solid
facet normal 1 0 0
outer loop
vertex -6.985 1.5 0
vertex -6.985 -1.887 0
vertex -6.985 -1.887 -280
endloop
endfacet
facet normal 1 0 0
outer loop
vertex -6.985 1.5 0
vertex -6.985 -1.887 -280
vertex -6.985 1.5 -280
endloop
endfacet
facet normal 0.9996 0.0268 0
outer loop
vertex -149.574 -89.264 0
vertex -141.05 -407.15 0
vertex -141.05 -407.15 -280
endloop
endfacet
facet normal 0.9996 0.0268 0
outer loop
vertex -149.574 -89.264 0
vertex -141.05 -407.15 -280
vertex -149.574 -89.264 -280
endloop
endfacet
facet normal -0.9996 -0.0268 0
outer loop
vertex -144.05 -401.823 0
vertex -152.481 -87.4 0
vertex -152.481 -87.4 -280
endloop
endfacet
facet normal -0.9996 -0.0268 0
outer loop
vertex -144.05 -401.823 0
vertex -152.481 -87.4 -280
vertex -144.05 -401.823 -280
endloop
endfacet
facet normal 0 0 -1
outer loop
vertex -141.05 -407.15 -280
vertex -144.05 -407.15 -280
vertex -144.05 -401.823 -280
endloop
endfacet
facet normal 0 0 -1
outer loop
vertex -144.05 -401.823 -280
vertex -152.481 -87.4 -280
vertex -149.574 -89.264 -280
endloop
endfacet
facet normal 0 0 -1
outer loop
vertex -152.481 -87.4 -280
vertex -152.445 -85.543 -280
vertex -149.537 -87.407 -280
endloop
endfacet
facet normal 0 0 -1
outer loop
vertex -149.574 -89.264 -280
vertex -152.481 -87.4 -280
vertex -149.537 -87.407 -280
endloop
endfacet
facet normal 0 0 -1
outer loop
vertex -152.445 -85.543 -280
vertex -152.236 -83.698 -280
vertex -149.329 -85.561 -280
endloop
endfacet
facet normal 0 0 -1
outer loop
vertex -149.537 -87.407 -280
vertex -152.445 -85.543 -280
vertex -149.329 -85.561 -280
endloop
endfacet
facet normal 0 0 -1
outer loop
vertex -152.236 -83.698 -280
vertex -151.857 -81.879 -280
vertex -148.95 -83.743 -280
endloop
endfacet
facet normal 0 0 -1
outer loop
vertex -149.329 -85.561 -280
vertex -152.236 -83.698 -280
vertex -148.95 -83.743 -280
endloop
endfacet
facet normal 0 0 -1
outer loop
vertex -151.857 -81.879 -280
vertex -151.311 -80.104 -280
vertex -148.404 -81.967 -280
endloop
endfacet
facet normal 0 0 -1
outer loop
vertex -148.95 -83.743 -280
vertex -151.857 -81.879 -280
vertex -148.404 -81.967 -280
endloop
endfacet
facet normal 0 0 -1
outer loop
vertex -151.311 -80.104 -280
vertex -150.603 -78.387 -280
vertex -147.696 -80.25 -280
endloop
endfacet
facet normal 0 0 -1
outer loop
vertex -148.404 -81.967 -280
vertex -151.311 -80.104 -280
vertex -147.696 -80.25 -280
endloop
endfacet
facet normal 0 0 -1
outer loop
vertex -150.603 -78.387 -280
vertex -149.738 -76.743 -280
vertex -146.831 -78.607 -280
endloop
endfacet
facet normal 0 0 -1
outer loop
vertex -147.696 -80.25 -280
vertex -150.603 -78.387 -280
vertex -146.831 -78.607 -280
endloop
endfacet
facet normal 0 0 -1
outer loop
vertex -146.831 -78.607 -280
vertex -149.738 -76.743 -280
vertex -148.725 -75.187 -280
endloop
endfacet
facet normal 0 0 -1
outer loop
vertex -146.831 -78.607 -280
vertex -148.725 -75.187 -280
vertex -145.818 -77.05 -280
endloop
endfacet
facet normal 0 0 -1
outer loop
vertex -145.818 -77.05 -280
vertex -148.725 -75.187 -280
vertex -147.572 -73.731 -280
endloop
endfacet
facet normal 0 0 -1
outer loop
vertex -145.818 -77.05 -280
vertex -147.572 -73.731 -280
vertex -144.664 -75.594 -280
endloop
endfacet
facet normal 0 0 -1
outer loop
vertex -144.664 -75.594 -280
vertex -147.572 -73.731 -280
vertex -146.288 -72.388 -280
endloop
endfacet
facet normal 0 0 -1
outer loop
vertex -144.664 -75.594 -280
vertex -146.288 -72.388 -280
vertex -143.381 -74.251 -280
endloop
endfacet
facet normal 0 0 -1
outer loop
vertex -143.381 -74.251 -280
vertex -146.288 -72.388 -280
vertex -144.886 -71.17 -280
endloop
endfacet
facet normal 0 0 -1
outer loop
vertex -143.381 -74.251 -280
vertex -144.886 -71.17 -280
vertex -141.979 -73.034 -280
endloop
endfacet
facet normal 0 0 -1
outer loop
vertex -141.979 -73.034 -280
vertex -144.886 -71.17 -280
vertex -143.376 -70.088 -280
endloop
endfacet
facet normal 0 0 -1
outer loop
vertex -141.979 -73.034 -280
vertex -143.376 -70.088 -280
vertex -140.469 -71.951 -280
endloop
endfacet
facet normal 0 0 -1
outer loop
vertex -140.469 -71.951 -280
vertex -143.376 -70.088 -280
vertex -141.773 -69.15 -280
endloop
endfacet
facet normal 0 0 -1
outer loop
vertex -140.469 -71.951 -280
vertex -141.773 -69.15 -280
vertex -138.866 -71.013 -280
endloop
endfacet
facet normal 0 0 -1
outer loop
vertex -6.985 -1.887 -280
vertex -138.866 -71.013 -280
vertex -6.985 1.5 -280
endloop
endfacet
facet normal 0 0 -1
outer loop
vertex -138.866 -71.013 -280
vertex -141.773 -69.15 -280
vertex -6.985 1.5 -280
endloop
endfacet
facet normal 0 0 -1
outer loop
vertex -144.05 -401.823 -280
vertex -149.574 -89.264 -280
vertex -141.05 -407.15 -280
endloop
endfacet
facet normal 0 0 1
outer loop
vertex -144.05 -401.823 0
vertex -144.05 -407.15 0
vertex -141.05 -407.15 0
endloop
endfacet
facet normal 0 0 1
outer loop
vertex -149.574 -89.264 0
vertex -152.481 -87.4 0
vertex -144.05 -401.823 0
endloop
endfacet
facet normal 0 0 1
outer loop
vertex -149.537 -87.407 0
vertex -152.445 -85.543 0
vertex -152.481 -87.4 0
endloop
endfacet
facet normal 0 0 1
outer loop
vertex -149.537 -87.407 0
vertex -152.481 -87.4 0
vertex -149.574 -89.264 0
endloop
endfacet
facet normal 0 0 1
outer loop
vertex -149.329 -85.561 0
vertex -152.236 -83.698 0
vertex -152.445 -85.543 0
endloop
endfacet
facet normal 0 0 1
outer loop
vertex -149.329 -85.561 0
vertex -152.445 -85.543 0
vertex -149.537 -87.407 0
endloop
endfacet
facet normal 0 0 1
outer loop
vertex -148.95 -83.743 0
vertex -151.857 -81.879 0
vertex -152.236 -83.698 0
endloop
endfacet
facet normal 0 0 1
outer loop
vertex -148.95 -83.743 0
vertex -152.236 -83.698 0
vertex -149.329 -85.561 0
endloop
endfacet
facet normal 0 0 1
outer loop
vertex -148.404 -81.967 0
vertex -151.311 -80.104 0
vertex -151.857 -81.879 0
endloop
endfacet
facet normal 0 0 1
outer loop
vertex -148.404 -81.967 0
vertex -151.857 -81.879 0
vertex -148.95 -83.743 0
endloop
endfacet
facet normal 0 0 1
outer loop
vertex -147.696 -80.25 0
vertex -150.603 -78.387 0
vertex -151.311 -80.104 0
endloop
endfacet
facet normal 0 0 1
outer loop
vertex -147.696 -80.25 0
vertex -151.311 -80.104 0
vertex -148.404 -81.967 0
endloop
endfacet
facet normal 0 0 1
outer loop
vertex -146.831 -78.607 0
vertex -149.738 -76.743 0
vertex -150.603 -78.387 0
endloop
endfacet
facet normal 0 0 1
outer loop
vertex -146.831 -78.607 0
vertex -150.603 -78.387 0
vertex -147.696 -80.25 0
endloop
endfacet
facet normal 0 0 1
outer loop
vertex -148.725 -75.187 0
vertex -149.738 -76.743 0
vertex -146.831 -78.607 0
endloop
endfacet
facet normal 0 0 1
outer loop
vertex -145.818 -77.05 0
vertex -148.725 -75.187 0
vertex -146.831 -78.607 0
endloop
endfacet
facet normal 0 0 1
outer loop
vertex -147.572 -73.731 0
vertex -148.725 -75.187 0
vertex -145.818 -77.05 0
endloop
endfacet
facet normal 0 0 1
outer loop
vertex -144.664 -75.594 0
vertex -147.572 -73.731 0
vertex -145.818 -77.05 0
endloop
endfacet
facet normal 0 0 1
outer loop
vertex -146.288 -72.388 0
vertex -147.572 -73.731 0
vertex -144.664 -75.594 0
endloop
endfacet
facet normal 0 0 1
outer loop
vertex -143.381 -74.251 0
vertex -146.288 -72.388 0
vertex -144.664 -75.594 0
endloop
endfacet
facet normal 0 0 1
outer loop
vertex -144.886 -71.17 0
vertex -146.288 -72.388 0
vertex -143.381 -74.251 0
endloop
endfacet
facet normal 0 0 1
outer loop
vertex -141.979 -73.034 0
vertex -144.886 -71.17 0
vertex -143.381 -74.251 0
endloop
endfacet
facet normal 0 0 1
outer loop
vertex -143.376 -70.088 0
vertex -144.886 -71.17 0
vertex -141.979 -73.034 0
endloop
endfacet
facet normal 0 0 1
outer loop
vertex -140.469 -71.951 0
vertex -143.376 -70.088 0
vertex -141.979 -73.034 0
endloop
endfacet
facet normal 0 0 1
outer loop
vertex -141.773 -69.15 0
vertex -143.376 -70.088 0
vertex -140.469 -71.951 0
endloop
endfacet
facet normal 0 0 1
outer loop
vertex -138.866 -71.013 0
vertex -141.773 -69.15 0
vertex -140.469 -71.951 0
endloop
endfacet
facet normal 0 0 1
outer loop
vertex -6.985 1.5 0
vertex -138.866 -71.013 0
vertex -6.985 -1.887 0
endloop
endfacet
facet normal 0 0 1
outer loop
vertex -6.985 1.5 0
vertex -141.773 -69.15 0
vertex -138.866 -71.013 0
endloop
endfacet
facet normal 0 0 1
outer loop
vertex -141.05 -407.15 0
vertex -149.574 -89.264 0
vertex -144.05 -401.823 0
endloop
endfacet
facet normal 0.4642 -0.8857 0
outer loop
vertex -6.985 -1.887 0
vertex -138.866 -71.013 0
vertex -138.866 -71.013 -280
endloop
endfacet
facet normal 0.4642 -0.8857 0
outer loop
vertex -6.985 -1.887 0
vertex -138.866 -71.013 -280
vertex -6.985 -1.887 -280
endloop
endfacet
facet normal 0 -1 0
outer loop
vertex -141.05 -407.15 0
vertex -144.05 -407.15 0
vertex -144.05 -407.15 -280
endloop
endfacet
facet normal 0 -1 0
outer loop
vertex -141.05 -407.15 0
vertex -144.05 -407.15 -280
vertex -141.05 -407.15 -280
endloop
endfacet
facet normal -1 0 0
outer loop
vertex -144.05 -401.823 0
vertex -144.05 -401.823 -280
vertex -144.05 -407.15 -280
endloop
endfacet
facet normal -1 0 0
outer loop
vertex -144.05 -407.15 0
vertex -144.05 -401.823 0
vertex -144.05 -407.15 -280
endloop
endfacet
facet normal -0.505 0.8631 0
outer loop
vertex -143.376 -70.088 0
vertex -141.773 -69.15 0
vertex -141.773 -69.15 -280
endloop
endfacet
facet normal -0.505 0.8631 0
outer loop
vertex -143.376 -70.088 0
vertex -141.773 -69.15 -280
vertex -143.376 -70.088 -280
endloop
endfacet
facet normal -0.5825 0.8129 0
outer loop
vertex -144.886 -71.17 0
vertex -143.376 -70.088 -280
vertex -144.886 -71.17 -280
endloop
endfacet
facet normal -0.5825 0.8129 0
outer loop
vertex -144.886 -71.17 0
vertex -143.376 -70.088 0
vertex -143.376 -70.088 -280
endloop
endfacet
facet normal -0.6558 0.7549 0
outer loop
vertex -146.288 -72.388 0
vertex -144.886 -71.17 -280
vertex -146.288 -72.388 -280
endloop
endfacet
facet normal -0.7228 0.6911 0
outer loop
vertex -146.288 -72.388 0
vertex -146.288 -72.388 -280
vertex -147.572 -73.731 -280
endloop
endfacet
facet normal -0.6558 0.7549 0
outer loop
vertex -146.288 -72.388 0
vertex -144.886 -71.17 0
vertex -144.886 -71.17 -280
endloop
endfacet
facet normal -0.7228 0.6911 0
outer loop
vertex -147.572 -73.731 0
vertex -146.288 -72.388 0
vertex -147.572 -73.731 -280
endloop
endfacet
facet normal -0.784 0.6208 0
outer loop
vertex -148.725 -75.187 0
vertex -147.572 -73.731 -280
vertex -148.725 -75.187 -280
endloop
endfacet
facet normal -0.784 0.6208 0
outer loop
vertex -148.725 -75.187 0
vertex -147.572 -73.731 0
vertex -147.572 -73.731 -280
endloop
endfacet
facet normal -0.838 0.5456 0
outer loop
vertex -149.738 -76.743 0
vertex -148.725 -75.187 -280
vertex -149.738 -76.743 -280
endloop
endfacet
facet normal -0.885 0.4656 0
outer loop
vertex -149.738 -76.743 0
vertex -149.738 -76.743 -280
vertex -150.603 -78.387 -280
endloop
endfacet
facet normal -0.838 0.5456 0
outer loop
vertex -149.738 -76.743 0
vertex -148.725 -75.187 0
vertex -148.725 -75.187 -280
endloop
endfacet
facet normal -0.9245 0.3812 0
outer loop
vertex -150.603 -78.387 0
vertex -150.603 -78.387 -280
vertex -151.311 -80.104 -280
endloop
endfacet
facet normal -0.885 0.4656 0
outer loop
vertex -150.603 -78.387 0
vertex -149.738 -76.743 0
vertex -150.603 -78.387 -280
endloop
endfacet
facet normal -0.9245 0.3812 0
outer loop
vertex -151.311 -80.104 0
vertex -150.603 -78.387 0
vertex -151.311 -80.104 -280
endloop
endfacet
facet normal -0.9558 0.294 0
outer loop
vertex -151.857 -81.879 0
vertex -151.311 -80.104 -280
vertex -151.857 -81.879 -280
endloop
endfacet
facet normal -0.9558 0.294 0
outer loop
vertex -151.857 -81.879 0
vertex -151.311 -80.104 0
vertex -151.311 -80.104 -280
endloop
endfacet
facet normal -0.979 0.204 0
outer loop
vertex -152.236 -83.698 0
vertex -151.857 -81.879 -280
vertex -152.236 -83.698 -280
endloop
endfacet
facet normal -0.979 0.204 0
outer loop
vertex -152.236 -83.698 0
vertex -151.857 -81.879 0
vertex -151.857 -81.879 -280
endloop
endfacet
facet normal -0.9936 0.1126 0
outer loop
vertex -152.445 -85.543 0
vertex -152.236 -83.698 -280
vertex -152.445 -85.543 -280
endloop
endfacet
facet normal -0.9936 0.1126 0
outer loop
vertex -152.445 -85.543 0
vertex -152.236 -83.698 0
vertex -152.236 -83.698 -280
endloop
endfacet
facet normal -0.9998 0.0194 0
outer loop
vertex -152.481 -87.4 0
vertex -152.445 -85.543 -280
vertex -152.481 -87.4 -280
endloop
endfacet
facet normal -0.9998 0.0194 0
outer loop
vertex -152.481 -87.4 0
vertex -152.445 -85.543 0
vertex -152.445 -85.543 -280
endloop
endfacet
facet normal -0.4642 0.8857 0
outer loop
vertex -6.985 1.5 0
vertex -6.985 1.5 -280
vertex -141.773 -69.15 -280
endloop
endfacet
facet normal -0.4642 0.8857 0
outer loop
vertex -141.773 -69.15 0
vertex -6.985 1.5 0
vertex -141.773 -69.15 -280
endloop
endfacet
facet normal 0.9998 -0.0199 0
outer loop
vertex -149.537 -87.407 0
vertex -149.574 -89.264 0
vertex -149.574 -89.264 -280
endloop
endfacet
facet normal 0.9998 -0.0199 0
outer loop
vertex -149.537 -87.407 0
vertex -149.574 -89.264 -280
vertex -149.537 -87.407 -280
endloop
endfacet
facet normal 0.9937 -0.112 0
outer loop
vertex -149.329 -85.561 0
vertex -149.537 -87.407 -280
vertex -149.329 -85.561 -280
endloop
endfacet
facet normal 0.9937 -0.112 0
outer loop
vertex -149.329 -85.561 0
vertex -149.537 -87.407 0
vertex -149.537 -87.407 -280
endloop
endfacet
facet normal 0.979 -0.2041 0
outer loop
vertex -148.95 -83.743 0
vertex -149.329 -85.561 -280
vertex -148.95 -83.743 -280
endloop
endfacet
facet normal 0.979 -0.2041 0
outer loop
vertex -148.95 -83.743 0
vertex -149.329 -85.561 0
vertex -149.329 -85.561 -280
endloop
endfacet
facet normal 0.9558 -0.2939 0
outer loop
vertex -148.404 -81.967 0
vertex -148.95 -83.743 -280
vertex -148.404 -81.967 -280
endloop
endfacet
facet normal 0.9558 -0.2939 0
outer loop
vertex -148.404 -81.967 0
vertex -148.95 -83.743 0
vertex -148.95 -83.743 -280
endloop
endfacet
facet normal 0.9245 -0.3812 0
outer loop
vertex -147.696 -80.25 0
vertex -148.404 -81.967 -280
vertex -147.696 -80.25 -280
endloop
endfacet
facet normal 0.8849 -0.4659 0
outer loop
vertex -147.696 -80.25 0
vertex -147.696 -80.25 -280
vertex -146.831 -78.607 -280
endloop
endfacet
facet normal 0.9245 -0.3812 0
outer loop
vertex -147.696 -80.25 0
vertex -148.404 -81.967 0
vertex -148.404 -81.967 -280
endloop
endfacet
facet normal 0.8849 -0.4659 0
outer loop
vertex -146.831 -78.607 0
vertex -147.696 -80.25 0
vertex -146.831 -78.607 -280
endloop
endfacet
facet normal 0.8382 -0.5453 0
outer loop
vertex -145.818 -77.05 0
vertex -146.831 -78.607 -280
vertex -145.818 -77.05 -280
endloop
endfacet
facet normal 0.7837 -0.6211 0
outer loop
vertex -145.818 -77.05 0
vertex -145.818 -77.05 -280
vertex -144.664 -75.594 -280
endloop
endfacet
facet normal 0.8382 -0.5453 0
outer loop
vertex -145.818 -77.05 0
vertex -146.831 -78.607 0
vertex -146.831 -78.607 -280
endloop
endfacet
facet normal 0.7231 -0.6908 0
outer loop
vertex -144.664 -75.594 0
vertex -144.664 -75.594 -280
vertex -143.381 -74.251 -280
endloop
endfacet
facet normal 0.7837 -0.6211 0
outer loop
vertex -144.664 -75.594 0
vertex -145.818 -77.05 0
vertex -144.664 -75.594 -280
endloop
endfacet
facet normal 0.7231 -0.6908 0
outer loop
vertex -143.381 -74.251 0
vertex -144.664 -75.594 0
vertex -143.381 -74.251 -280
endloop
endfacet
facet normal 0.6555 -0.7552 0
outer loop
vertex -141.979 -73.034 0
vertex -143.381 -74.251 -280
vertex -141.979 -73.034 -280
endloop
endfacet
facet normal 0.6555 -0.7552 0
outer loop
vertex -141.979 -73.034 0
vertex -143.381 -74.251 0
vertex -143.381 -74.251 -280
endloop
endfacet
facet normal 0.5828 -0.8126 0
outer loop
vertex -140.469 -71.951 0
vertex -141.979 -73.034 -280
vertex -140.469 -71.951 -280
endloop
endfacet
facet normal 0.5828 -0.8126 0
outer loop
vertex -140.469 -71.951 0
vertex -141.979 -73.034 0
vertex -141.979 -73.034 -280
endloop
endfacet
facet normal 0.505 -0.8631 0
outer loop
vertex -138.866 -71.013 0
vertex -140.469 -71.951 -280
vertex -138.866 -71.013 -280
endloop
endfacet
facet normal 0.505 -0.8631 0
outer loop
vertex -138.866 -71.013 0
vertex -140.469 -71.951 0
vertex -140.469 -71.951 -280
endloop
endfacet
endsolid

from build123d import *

# Parameters (mm, degrees)
BOSS_EXTRUDE1_DEPTH = 280


with BuildPart() as part:
    # Sketch1 → Boss-Extrude1 (new body)
    with BuildSketch(Plane.XY):
        with BuildLine():
            Line((-6.985, -1.5), (-6.985, 0))
            Line((-6.985, 0), (-6.985, 1.5))
            Line((-6.985, 1.5), (-141.773150354, -69.150147775))
            ThreePointArc((-141.773150354, -69.150147775), (-149.738239599, -76.743206199), (-152.480995182, -87.400338774))
            Line((-152.480995182, -87.400338774), (-144.05, -401.823477062))
            Line((-144.05, -401.823477062), (-144.05, -407.15))
            Line((-144.05, -407.15), (-141.05, -407.15))
            Line((-141.05, -407.15), (-149.573857666, -89.263674623))
            ThreePointArc((-149.573857666, -89.263674623), (-146.831102083, -78.606542048), (-138.866012838, -71.013483624))
            Line((-138.866012838, -71.013483624), (-6.985, -1.887132226))
            Line((-6.985, -1.887132226), (-6.985, -1.5))
        make_face()
    extrude(amount=-BOSS_EXTRUDE1_DEPTH)


solid = part.part
